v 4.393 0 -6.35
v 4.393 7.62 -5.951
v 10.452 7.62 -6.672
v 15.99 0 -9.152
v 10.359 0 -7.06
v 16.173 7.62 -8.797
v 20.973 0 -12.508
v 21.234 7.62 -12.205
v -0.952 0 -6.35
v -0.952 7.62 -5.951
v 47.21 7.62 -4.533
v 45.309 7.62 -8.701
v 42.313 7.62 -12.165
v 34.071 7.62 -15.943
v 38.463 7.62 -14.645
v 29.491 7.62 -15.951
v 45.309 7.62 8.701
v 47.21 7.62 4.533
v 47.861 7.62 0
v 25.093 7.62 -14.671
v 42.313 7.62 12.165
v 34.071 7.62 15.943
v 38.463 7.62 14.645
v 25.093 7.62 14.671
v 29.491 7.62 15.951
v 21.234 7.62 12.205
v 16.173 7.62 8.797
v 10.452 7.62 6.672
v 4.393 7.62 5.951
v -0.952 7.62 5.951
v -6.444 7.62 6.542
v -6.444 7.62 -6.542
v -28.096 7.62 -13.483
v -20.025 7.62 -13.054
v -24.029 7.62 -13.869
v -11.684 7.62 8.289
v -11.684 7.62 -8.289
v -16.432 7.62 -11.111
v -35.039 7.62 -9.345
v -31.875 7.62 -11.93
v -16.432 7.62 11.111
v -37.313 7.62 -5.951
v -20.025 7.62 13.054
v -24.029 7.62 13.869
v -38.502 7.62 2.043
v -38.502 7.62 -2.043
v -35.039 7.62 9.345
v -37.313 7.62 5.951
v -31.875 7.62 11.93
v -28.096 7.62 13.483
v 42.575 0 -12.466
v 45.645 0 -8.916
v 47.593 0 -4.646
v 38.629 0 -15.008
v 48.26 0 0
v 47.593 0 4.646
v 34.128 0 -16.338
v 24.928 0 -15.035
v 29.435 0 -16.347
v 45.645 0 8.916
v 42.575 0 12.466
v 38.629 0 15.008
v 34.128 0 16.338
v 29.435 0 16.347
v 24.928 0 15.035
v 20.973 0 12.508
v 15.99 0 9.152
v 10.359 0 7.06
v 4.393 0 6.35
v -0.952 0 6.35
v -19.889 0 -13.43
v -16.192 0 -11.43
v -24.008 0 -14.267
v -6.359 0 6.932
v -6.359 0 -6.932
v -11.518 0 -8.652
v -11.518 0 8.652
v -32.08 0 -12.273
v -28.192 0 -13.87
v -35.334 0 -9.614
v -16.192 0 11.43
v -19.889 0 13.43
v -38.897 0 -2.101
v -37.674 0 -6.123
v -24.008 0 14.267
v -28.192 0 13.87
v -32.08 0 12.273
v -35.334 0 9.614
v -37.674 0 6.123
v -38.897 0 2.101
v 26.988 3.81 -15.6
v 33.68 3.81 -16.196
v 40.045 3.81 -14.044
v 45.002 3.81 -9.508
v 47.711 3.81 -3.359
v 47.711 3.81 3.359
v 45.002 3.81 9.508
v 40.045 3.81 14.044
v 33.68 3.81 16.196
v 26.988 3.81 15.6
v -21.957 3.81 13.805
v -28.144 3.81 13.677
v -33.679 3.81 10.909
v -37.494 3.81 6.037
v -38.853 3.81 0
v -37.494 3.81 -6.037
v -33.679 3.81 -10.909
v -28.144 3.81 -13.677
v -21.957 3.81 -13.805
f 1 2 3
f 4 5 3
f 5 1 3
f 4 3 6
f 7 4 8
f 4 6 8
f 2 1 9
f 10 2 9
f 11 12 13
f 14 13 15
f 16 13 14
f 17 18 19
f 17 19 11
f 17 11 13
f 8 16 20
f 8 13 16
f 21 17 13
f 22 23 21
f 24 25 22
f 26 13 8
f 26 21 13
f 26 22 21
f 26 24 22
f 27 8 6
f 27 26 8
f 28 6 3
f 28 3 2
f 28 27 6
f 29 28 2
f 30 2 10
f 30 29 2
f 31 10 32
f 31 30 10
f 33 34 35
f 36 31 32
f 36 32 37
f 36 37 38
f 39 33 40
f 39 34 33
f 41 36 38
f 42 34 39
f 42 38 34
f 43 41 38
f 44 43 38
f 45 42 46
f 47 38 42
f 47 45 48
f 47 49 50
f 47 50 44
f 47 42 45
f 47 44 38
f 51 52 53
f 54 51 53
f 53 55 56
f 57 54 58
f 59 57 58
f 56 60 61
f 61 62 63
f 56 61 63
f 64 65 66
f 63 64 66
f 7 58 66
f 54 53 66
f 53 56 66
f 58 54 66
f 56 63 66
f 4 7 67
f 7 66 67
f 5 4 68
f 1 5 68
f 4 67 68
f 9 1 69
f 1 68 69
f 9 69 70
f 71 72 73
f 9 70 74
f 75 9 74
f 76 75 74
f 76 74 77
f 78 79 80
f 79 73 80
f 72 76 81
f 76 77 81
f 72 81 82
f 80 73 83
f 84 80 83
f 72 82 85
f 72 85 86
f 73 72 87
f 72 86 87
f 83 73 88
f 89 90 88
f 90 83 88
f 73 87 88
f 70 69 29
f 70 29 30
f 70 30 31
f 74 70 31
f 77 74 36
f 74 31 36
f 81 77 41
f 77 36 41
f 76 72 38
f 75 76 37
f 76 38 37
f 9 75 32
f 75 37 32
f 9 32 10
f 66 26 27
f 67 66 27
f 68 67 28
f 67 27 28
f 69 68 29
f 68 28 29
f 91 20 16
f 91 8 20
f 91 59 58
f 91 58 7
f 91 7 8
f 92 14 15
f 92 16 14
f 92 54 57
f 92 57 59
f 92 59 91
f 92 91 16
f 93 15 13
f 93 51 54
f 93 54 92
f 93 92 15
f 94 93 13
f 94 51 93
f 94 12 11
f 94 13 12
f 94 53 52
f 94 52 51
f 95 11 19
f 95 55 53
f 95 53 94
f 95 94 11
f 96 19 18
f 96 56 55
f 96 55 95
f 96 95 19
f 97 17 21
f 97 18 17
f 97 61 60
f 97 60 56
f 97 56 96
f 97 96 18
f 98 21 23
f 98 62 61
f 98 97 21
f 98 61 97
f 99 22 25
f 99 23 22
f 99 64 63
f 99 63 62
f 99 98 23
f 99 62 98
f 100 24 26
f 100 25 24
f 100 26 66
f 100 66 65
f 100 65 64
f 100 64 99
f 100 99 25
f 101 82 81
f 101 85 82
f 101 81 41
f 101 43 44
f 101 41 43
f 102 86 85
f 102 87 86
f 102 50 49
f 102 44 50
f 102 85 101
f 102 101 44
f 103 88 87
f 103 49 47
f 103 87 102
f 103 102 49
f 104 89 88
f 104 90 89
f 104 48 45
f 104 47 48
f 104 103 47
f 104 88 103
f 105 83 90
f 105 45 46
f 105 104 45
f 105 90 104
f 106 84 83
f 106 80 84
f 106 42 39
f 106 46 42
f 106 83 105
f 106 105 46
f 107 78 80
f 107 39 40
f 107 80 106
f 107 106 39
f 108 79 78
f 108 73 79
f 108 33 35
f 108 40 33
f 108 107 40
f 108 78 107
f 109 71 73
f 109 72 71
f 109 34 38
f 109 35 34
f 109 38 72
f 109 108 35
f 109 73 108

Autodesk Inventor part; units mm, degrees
ref_plane "YZ Plane" through (0, 0, 0) normal (1, 0, 0) x (0, 1, 0)
ref_plane "XZ Plane" through (0, 0, 0) normal (0, 1, 0) x (-1, 0, 0)
ref_plane "XY Plane" through (0, 0, 0) normal (0, 0, 1) x (1, 0, 0)
sketch "Sketch1" plane through (0, 0, 0) normal (0, 1, 0) x (-1, 0, 0)
  circle A0 centre (-31.75, 0) radius 11.0744
  circle A1 centre (24.765, 0) radius 9.652
  line L0 (-16.51, -6.35) -> (11.9662, -6.35)
  circle A2 centre (24.765, 0) radius 14.2875
  circle A3 centre (-31.75, 0) radius 16.51
  line L1 (-16.51, 6.35) -> (11.9662, 6.35)
  point P0 (0, 0)
  dimension "d15" = 22.1488
  dimension "d17" = 12.7
  dimension "d18" = 33.02
  dimension "d19" = 19.304
  dimension "d20" = 28.575
  dimension "d21" = 56.515
extrude "Extrusion2" add sketch "Sketch1" along normal blind 7.62 contours A0 | A1 | A3 L1 A2 L0 | A3 | A2
fillet "Fillet3" radius 25.4 4 edges at (-11.9662, 3.81, 6.35) (-11.9662, 3.81, -6.35) (16.51, 3.81, -6.35) (16.51, 3.81, 6.35)
draft "FaceDraft2" angle 3 pull direction (0, 1, 0) faces at (41.7415, 5.08, -13.1435) (14.1702, 2.54, 8.307) (8.391, 2.54, -6.6666) (0.8295, 2.54, 6.35) (2.6114, 2.54, -6.35) (-2.7671, 2.54, 6.4149) (-4.5723, 2.54, -6.6093) (-18.1739, 5.08, 12.6764) fixed edges at (48.26, 0, 0) (13.2365, 0, 7.9391) (13.2365, 0, -7.9391) (1.7204, 0, 6.35) (1.7204, 0, -6.35) (-8.9847, 0, 7.6534) (-8.9847, 0, -7.6534) (-39.0525, 0, 0)
properties part number "Connecting Rod Cast Image"
